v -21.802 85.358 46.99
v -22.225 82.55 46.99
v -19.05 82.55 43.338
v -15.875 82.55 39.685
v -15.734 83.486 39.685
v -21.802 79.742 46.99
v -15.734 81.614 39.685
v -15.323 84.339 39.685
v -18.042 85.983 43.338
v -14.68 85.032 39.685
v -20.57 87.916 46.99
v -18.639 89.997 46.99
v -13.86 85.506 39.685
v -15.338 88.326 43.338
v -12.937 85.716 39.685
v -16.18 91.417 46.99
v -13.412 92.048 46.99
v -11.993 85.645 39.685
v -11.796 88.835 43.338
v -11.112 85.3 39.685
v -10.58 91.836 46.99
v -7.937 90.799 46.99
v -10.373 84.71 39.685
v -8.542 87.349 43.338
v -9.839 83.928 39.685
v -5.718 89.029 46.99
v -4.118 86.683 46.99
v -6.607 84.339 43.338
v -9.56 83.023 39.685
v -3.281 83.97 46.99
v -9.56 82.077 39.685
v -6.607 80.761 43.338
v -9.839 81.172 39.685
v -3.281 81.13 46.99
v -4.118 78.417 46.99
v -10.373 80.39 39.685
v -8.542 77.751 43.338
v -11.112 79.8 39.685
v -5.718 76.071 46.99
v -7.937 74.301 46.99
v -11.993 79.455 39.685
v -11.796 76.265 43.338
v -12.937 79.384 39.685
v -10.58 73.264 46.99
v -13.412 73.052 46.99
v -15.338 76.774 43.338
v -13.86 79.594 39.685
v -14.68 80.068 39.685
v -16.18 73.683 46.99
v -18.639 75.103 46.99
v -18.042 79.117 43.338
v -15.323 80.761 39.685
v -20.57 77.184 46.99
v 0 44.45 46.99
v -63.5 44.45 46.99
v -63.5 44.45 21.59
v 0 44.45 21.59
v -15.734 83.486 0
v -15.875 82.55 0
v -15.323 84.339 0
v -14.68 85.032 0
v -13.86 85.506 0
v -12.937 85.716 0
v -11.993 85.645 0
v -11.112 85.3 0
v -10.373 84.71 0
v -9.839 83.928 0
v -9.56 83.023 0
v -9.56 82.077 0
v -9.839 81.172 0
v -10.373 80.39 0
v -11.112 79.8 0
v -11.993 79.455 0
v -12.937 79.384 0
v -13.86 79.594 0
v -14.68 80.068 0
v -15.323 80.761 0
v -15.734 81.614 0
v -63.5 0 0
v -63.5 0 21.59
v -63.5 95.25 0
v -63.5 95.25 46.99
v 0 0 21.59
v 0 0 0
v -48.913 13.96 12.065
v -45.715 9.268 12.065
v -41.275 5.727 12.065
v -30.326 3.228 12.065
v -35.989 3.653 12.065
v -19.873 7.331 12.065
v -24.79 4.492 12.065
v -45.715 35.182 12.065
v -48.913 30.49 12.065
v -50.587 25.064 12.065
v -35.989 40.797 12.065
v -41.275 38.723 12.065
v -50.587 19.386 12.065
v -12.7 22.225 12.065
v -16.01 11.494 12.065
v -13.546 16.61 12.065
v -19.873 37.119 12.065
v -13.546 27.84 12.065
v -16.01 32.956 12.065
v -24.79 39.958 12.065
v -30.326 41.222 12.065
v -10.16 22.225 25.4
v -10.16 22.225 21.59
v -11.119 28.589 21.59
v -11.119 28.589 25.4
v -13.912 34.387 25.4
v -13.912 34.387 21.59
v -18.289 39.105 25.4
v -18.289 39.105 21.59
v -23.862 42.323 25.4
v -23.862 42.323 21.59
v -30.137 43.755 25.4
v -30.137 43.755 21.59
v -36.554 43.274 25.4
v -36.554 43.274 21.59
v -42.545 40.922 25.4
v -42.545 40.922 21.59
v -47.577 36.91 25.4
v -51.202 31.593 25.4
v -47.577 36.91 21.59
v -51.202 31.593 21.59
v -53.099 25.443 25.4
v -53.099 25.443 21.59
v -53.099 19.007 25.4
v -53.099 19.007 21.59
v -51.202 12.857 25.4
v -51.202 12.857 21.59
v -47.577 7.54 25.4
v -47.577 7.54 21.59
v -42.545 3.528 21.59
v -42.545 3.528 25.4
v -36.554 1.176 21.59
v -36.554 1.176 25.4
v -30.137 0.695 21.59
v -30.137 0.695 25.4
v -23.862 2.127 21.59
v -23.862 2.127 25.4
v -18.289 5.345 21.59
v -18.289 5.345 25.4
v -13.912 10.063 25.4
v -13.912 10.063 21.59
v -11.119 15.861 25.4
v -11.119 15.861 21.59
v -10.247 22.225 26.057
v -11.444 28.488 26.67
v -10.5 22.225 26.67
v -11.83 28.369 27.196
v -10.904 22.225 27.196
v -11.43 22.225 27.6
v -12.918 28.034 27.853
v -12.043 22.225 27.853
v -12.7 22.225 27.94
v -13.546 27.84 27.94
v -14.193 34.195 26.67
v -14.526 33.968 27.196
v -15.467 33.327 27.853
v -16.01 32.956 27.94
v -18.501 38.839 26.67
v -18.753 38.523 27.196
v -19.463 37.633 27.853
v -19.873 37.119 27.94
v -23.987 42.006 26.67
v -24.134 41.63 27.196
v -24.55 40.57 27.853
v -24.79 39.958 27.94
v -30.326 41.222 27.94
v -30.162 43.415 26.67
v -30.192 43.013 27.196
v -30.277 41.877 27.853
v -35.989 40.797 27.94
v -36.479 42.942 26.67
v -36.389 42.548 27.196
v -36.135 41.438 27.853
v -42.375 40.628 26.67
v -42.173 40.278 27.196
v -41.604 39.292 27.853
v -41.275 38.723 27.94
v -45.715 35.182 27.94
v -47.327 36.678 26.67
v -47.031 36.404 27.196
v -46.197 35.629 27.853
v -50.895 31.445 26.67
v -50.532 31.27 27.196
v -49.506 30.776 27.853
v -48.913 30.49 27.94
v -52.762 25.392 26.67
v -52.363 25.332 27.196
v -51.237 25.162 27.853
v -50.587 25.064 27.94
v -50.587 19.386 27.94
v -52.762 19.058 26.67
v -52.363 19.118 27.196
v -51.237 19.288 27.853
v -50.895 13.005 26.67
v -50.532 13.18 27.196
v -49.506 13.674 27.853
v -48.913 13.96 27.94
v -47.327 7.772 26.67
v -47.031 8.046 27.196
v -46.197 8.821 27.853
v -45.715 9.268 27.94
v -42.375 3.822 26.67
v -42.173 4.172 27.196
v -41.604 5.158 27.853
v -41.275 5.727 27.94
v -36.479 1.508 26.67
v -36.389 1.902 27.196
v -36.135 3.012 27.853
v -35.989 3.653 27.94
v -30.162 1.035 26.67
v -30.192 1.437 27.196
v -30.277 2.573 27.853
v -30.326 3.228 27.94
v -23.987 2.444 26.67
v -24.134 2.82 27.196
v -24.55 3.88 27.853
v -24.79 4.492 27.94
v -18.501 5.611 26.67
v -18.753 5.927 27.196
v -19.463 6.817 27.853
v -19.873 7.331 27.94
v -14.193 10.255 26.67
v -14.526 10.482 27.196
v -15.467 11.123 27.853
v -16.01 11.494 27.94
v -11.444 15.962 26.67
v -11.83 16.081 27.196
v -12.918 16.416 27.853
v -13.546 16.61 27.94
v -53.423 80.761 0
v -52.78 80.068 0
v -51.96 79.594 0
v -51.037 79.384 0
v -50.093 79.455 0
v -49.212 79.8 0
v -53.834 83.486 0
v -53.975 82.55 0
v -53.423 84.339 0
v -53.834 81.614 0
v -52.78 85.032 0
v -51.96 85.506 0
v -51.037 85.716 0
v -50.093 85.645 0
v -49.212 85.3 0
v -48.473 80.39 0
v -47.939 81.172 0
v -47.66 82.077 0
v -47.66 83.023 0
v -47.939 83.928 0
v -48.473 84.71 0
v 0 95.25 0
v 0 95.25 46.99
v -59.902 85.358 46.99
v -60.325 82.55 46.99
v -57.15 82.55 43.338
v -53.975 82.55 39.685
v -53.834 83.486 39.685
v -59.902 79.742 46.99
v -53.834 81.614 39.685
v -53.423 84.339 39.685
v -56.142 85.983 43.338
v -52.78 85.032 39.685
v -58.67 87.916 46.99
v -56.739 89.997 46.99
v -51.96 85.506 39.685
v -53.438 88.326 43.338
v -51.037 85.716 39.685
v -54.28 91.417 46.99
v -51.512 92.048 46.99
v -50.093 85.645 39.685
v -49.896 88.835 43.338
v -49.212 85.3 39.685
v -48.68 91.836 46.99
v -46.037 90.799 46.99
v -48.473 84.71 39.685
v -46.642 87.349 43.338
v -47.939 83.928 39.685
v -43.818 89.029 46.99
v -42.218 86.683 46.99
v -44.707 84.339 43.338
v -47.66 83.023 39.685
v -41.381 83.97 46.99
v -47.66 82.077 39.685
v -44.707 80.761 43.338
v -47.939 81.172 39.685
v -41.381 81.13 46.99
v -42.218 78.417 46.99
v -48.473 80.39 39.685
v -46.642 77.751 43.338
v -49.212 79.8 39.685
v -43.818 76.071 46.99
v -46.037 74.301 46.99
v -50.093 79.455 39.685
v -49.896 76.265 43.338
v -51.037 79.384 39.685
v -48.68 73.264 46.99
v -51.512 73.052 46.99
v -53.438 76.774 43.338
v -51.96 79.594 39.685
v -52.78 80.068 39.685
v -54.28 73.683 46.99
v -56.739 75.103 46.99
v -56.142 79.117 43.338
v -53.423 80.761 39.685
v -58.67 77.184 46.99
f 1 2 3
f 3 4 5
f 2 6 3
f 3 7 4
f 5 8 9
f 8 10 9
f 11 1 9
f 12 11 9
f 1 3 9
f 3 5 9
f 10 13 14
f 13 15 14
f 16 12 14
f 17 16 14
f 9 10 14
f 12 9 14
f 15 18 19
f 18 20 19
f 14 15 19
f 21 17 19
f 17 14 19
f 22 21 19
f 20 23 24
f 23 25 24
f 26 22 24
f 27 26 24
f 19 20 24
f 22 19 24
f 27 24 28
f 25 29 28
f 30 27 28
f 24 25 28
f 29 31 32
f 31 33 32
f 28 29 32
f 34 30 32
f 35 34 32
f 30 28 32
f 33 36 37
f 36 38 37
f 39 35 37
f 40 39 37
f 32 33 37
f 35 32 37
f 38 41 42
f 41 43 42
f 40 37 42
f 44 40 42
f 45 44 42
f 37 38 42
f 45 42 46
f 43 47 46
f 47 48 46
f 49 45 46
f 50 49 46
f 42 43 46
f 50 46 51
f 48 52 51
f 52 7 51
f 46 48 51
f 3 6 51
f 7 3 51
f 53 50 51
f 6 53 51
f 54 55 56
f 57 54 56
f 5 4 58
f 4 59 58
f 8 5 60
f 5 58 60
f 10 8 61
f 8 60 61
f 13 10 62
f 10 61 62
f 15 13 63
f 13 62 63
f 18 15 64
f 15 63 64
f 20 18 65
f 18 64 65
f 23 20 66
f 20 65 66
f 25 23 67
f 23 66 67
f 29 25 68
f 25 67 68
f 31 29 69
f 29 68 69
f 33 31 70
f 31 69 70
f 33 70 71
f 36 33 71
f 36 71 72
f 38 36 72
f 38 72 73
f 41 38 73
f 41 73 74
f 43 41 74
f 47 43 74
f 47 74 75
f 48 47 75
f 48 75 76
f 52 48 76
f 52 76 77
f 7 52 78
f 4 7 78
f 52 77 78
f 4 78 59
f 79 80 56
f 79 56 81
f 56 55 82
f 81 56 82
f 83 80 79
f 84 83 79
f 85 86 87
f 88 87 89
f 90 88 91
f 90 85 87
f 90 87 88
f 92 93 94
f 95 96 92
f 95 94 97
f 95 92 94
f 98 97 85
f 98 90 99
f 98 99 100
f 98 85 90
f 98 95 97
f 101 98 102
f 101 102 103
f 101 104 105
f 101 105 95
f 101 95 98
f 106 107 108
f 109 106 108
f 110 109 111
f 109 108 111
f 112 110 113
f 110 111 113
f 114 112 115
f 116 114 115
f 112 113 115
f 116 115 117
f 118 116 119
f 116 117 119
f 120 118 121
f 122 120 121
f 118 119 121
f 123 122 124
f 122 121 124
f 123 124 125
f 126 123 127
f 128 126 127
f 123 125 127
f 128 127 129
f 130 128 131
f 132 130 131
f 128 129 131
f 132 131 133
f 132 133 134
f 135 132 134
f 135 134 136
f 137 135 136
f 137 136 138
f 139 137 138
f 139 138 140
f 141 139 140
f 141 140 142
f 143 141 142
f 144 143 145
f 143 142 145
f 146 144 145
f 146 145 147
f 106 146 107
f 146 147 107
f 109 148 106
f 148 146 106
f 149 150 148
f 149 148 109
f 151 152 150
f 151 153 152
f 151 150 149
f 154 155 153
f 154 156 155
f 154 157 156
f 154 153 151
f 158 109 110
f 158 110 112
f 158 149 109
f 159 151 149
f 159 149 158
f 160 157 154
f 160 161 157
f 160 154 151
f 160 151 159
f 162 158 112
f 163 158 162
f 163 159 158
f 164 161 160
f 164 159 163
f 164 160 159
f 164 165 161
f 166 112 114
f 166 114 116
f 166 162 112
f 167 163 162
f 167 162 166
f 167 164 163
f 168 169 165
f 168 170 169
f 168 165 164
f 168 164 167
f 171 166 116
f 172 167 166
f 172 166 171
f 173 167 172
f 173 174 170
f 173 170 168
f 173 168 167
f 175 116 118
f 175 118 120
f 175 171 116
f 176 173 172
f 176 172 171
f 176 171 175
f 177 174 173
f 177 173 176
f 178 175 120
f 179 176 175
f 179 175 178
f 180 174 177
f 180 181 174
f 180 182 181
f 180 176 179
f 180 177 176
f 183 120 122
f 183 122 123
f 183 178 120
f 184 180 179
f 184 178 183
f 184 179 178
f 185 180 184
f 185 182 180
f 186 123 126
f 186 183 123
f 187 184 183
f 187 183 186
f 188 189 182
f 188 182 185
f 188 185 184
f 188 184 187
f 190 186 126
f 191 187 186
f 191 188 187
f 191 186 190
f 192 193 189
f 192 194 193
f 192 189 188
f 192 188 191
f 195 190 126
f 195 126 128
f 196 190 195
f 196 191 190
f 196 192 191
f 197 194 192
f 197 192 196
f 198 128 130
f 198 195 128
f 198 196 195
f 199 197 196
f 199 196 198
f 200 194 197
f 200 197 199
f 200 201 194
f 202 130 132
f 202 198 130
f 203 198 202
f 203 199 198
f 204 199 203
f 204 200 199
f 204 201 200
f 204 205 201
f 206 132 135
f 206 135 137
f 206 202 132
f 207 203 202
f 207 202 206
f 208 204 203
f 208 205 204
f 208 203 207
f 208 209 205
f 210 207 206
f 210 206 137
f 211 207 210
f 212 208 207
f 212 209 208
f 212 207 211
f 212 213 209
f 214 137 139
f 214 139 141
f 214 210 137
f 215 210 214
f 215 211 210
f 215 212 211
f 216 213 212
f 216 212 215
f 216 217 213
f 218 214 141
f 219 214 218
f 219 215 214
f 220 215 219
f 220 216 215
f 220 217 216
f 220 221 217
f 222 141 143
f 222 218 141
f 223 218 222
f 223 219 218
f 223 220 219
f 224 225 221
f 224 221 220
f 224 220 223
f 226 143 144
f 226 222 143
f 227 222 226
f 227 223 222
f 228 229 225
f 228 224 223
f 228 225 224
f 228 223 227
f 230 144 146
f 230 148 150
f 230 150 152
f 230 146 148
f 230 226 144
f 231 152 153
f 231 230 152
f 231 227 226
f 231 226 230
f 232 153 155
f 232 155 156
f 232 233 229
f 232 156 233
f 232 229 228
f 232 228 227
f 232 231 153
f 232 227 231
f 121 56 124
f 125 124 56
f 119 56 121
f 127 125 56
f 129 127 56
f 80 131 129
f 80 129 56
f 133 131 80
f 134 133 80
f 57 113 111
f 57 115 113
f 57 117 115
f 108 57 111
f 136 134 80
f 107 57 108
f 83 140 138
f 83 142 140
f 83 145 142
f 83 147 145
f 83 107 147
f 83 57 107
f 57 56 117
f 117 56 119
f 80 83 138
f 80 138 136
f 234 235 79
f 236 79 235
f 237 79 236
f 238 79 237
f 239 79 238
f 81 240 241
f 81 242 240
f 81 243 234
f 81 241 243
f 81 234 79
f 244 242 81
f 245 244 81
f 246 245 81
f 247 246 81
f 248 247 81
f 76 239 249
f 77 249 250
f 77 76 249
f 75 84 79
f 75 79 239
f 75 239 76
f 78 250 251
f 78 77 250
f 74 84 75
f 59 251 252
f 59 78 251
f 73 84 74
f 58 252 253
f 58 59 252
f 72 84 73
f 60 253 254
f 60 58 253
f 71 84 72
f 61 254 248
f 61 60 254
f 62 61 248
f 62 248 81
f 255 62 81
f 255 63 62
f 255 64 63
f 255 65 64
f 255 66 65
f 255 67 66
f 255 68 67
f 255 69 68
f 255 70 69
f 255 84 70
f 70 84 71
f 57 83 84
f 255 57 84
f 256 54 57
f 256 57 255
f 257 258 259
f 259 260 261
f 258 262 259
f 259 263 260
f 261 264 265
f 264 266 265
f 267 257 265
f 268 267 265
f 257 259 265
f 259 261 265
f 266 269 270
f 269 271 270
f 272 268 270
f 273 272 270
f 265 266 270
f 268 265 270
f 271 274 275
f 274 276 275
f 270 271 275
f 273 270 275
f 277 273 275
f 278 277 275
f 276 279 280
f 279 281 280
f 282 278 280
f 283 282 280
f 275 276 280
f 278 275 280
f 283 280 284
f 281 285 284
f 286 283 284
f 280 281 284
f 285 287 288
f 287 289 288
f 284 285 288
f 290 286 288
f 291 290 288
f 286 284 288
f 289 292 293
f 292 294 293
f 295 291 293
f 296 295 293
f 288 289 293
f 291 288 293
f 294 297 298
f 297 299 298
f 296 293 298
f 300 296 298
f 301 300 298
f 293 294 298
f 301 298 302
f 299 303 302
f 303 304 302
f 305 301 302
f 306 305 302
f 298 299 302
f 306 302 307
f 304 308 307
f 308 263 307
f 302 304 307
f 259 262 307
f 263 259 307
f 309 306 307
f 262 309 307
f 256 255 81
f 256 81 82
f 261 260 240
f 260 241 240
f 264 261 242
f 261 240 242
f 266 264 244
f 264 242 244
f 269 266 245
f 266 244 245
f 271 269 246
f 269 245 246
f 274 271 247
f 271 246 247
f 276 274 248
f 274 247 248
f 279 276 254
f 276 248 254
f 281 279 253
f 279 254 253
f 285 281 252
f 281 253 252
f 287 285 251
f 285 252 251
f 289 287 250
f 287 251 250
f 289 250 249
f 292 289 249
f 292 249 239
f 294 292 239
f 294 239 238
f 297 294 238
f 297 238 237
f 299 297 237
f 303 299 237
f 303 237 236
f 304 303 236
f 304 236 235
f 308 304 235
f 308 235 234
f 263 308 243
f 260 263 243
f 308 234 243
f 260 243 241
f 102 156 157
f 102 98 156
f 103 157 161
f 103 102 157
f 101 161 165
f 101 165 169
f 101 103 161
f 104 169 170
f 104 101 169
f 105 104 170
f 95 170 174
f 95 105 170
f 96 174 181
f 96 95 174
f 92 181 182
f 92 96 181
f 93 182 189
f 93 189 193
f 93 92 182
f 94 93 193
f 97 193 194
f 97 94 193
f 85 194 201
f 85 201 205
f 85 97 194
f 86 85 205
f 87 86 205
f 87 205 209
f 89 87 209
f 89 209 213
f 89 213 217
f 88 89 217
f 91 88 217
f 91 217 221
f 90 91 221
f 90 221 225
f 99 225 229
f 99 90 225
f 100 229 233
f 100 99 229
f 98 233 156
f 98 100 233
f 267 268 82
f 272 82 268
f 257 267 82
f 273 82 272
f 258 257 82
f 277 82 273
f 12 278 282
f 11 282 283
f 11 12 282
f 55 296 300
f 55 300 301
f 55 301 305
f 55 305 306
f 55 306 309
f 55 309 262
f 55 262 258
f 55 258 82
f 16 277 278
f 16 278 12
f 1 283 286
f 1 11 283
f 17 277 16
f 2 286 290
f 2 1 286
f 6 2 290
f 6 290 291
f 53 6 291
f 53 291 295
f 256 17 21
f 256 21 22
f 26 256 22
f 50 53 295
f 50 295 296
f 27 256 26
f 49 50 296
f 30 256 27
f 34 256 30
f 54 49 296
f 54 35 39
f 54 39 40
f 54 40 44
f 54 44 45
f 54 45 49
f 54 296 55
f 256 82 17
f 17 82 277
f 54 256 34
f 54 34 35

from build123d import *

# Parameters (mm, degrees)
F1_DEPTH       = 63.5
F2_R           = 19.05
F3_DEPTH       = 9.525
F4_R           = 21.59
F4_R_2         = 19.05
F5_DEPTH       = 6.35
F6_R           = 2.53999
F8_D           = 6.35
F8_CSINK_D     = 19.05
F8_CSINK_ANGLE = 82


# Not quite as in the source:
# - a fillet or chamfer is up to 0.001 mm smaller than in the source, because OpenCascade refuses the exact size


with BuildPart() as f1:
    # F0 (on Right) → F1 (new body)
    with BuildSketch(Plane.YZ):
        Polygon((0, 21.59), (0, 0), (95.25, 0), (95.25, 46.99), (44.45, 46.99), (44.45, 21.59), align=None)
    extrude(amount=-F1_DEPTH)

    # F2 (on face) → F3 (cut)
    with BuildSketch(Plane.XY.offset(21.59)):
        with Locations((-31.75, 22.225)):
            Circle(F2_R)
    extrude(amount=-F3_DEPTH, mode=Mode.SUBTRACT)

    # F4 (on face) → F5 (join)
    with BuildSketch(Plane.XY.offset(21.59)):
        with Locations((-31.75, 22.225)):
            Circle(F4_R)
        with Locations((-31.75, 22.225)):
            Circle(F4_R_2, mode=Mode.SUBTRACT)
    extrude(amount=F5_DEPTH)

    # F6 (radius 2.54 in the source; OpenCascade refuses exactly that, so slightly less here)
    f6_edges = [f1.edges().sort_by_distance(p)[0] for p in [
        (-53.34, 22.225, 27.94),
    ]]
    fillet(f6_edges, radius=F6_R)

    # F8 (through all)
    with Locations(Plane.XY.offset(46.99)):
        with Locations((-50.8, 82.55), (-12.7, 82.55)):
            CounterSinkHole(F8_D / 2, F8_CSINK_D / 2, counter_sink_angle=F8_CSINK_ANGLE)


solid = f1.part
